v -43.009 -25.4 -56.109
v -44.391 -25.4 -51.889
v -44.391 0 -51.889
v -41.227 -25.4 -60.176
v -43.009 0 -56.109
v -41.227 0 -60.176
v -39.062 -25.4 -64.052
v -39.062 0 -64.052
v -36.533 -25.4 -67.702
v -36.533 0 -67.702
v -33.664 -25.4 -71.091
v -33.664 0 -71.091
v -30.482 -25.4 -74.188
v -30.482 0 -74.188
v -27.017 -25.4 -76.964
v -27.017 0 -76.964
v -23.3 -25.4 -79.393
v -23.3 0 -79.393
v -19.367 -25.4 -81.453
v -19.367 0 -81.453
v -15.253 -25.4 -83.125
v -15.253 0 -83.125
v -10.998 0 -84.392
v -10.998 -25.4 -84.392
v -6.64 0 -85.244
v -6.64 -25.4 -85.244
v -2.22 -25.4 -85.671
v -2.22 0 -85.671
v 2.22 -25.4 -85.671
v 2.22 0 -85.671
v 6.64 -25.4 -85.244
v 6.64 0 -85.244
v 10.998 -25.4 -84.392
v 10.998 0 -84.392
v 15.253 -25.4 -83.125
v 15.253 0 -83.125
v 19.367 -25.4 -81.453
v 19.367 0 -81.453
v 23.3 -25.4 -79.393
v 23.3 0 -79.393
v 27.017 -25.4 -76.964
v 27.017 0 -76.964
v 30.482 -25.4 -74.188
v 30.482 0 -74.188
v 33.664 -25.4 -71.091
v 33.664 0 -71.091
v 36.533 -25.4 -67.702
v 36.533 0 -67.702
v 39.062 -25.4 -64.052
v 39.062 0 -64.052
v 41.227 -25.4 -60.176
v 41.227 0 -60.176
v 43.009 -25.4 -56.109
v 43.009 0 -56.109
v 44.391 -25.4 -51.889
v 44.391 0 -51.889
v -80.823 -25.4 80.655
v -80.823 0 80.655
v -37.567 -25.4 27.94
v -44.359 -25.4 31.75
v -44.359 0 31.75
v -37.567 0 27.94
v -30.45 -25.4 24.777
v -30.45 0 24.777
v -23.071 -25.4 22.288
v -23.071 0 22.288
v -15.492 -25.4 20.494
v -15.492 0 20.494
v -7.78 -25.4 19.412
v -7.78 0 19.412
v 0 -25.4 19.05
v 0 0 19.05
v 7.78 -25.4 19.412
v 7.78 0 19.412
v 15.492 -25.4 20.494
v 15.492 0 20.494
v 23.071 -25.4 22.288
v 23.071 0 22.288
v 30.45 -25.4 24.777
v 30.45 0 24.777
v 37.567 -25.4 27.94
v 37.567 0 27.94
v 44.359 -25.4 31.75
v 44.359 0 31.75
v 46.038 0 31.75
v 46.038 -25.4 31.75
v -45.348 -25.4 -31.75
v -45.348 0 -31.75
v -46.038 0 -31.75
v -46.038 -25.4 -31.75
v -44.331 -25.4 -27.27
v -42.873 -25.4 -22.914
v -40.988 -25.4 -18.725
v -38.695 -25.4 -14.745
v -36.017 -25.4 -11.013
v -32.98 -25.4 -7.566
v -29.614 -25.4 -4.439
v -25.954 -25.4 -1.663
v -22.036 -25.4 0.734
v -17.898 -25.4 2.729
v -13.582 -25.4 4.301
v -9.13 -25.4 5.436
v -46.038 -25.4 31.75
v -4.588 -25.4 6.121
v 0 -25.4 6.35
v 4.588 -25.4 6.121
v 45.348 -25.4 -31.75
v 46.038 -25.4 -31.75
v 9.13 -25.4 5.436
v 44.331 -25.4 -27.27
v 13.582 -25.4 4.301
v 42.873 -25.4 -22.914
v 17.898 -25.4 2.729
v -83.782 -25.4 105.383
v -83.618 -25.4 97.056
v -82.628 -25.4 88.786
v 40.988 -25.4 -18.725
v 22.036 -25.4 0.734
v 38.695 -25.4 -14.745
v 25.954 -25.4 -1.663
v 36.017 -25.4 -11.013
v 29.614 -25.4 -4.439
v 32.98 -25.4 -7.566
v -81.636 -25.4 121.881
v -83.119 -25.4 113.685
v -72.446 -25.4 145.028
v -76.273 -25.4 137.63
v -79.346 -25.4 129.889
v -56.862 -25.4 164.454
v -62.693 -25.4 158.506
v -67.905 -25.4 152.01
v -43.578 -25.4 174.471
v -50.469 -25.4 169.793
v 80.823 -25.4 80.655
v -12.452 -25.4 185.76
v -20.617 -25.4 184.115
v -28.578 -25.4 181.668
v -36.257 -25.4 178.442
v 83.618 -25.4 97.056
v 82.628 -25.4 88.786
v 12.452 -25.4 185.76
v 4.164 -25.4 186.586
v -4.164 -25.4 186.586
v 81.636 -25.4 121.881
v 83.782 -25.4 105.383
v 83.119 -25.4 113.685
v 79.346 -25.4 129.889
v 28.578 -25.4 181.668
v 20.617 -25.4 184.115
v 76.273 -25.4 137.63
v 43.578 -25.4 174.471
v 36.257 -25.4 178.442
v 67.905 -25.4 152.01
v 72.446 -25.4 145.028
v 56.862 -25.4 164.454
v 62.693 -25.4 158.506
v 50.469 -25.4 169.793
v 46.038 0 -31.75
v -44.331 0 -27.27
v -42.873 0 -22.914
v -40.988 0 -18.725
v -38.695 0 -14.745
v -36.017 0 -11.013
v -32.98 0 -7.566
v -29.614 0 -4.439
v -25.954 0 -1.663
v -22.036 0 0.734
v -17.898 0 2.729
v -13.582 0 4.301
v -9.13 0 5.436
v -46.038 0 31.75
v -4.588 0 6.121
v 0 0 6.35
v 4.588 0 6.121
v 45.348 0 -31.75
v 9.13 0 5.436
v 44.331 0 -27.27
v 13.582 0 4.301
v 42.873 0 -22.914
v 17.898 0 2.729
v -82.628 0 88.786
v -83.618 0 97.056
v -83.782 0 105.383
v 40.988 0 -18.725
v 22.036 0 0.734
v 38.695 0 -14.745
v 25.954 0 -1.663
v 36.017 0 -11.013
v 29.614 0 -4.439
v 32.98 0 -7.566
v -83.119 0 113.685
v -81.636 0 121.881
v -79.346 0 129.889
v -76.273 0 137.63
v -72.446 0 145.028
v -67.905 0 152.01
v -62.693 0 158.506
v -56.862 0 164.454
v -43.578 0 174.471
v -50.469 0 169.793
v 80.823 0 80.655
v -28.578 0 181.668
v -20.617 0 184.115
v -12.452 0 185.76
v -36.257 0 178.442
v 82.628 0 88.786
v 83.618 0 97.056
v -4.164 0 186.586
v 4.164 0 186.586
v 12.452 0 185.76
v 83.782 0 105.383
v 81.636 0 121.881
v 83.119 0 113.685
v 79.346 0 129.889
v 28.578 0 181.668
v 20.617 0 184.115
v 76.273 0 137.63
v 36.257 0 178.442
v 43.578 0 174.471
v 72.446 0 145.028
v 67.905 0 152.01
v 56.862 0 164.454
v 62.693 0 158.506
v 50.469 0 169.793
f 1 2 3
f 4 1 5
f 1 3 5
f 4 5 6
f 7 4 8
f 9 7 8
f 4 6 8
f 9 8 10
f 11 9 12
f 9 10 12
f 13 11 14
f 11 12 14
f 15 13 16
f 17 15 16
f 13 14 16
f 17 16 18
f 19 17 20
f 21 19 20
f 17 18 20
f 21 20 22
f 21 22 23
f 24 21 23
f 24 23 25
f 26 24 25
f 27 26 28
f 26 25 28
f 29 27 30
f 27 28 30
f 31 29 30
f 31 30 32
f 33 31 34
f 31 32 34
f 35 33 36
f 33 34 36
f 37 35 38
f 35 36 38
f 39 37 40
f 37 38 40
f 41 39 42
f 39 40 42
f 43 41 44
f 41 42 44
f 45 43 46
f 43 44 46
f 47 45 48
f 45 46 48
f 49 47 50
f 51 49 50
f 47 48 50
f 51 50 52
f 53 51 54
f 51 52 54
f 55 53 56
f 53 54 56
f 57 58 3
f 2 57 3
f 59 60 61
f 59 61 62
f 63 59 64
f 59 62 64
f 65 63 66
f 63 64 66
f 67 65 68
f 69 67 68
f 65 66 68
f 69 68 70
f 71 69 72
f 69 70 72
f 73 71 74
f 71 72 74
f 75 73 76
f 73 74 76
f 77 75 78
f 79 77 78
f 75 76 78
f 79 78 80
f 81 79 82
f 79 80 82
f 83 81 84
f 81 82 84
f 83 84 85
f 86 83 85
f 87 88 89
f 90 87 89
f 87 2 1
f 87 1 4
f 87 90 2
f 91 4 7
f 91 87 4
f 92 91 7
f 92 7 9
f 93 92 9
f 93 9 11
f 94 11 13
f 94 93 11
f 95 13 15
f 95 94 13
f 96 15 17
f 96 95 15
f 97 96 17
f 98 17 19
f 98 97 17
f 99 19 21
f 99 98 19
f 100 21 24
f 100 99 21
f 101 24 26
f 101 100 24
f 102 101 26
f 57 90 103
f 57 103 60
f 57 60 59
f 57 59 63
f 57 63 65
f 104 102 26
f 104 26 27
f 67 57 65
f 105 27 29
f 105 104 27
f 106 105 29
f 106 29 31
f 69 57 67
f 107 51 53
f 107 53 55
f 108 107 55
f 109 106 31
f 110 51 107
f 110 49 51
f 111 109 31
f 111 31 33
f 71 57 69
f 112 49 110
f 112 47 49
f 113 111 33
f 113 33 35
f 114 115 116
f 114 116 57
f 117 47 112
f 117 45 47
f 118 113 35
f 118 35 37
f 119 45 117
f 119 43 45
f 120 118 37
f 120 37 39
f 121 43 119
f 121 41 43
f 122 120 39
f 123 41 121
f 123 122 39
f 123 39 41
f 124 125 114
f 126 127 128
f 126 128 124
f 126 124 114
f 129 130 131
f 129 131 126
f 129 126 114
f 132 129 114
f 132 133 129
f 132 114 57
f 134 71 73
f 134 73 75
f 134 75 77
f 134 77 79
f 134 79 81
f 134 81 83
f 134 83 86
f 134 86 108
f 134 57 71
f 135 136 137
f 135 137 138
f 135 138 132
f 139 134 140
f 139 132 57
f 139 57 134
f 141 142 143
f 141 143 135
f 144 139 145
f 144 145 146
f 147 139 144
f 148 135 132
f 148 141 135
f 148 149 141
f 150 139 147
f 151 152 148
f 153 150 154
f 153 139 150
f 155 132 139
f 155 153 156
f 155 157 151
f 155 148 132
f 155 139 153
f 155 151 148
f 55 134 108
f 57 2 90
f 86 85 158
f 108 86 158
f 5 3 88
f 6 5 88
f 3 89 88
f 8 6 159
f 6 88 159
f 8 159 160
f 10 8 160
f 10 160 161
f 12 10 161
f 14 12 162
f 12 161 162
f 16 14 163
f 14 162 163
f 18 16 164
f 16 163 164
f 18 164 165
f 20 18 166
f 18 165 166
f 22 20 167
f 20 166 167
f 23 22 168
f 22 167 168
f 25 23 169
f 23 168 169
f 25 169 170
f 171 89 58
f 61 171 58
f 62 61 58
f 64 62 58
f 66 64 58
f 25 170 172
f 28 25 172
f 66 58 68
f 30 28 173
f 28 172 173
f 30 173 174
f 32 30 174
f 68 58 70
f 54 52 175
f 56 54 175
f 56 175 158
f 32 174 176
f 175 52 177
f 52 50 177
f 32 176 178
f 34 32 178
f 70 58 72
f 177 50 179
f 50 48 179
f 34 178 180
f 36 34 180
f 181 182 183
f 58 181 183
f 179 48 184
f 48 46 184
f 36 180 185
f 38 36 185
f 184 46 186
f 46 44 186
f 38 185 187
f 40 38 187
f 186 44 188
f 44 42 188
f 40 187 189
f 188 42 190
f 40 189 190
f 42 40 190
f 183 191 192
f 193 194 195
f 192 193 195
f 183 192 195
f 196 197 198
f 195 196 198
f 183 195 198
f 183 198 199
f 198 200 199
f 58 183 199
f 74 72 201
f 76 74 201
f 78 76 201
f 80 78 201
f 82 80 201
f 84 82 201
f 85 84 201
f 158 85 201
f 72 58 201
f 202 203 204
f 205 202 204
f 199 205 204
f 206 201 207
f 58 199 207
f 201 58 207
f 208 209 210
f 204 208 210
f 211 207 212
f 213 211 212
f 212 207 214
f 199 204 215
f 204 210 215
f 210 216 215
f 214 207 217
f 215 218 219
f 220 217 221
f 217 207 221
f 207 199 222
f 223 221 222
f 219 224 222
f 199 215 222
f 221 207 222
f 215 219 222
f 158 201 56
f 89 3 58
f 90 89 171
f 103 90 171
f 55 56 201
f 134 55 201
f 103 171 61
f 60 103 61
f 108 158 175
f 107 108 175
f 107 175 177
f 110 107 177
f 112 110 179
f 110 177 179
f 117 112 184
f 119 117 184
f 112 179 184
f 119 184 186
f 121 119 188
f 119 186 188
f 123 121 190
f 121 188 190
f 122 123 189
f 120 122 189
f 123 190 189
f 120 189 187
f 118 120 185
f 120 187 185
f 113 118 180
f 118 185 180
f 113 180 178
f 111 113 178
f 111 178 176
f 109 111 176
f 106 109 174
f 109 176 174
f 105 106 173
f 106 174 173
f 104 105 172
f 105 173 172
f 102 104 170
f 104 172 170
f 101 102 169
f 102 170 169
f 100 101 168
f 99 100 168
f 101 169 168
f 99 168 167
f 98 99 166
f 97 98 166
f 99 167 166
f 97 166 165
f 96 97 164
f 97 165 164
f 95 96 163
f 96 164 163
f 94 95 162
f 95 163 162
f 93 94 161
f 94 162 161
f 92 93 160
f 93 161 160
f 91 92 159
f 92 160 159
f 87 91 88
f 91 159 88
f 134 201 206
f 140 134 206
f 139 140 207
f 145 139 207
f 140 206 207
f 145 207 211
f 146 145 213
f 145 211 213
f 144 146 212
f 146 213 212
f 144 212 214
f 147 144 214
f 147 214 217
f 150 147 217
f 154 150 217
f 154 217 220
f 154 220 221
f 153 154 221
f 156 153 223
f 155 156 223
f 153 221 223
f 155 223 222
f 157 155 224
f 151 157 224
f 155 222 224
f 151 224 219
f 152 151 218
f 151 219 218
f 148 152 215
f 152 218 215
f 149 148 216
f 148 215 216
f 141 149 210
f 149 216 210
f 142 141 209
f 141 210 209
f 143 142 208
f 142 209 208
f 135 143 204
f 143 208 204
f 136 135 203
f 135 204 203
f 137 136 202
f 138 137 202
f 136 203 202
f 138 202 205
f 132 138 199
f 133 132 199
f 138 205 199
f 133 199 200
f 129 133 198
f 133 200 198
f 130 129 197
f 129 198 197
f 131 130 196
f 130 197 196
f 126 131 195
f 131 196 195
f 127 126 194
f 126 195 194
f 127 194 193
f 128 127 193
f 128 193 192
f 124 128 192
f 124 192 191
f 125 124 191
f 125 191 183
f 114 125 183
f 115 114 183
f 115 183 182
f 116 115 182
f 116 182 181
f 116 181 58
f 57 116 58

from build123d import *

# Parameters (mm, degrees)
F1_DEPTH = 25.4


with BuildPart() as f1:
    # F0 (on Front) → F1 (new body)
    with BuildSketch(Plane.XZ):
        with BuildLine():
            Line((44.391164, -51.888976), (80.822532, 80.6549))
            ThreePointArc((80.822532, 80.6549), (0, 186.69), (-80.822532, 80.6549))
            Line((-80.822532, 80.6549), (-44.391164, -51.888976))
            ThreePointArc((-44.391164, -51.888976), (0, -85.725), (44.391164, -51.888976))
        make_face()
        with BuildLine():
            Line((44.359193, 31.75), (46.0375, 31.75))
            Line((46.0375, 31.75), (46.0375, -31.75))
            Line((46.0375, -31.75), (45.348071, -31.75))
            ThreePointArc((45.348071, -31.75), (0, 6.35), (-45.348071, -31.75))
            Line((-45.348071, -31.75), (-46.0375, -31.75))
            Line((-46.0375, -31.75), (-46.0375, 31.75))
            Line((-46.0375, 31.75), (-44.359193, 31.75))
            ThreePointArc((-44.359193, 31.75), (0, 19.05), (44.359193, 31.75))
        make_face(mode=Mode.SUBTRACT)
    extrude(amount=F1_DEPTH)


solid = f1.part
